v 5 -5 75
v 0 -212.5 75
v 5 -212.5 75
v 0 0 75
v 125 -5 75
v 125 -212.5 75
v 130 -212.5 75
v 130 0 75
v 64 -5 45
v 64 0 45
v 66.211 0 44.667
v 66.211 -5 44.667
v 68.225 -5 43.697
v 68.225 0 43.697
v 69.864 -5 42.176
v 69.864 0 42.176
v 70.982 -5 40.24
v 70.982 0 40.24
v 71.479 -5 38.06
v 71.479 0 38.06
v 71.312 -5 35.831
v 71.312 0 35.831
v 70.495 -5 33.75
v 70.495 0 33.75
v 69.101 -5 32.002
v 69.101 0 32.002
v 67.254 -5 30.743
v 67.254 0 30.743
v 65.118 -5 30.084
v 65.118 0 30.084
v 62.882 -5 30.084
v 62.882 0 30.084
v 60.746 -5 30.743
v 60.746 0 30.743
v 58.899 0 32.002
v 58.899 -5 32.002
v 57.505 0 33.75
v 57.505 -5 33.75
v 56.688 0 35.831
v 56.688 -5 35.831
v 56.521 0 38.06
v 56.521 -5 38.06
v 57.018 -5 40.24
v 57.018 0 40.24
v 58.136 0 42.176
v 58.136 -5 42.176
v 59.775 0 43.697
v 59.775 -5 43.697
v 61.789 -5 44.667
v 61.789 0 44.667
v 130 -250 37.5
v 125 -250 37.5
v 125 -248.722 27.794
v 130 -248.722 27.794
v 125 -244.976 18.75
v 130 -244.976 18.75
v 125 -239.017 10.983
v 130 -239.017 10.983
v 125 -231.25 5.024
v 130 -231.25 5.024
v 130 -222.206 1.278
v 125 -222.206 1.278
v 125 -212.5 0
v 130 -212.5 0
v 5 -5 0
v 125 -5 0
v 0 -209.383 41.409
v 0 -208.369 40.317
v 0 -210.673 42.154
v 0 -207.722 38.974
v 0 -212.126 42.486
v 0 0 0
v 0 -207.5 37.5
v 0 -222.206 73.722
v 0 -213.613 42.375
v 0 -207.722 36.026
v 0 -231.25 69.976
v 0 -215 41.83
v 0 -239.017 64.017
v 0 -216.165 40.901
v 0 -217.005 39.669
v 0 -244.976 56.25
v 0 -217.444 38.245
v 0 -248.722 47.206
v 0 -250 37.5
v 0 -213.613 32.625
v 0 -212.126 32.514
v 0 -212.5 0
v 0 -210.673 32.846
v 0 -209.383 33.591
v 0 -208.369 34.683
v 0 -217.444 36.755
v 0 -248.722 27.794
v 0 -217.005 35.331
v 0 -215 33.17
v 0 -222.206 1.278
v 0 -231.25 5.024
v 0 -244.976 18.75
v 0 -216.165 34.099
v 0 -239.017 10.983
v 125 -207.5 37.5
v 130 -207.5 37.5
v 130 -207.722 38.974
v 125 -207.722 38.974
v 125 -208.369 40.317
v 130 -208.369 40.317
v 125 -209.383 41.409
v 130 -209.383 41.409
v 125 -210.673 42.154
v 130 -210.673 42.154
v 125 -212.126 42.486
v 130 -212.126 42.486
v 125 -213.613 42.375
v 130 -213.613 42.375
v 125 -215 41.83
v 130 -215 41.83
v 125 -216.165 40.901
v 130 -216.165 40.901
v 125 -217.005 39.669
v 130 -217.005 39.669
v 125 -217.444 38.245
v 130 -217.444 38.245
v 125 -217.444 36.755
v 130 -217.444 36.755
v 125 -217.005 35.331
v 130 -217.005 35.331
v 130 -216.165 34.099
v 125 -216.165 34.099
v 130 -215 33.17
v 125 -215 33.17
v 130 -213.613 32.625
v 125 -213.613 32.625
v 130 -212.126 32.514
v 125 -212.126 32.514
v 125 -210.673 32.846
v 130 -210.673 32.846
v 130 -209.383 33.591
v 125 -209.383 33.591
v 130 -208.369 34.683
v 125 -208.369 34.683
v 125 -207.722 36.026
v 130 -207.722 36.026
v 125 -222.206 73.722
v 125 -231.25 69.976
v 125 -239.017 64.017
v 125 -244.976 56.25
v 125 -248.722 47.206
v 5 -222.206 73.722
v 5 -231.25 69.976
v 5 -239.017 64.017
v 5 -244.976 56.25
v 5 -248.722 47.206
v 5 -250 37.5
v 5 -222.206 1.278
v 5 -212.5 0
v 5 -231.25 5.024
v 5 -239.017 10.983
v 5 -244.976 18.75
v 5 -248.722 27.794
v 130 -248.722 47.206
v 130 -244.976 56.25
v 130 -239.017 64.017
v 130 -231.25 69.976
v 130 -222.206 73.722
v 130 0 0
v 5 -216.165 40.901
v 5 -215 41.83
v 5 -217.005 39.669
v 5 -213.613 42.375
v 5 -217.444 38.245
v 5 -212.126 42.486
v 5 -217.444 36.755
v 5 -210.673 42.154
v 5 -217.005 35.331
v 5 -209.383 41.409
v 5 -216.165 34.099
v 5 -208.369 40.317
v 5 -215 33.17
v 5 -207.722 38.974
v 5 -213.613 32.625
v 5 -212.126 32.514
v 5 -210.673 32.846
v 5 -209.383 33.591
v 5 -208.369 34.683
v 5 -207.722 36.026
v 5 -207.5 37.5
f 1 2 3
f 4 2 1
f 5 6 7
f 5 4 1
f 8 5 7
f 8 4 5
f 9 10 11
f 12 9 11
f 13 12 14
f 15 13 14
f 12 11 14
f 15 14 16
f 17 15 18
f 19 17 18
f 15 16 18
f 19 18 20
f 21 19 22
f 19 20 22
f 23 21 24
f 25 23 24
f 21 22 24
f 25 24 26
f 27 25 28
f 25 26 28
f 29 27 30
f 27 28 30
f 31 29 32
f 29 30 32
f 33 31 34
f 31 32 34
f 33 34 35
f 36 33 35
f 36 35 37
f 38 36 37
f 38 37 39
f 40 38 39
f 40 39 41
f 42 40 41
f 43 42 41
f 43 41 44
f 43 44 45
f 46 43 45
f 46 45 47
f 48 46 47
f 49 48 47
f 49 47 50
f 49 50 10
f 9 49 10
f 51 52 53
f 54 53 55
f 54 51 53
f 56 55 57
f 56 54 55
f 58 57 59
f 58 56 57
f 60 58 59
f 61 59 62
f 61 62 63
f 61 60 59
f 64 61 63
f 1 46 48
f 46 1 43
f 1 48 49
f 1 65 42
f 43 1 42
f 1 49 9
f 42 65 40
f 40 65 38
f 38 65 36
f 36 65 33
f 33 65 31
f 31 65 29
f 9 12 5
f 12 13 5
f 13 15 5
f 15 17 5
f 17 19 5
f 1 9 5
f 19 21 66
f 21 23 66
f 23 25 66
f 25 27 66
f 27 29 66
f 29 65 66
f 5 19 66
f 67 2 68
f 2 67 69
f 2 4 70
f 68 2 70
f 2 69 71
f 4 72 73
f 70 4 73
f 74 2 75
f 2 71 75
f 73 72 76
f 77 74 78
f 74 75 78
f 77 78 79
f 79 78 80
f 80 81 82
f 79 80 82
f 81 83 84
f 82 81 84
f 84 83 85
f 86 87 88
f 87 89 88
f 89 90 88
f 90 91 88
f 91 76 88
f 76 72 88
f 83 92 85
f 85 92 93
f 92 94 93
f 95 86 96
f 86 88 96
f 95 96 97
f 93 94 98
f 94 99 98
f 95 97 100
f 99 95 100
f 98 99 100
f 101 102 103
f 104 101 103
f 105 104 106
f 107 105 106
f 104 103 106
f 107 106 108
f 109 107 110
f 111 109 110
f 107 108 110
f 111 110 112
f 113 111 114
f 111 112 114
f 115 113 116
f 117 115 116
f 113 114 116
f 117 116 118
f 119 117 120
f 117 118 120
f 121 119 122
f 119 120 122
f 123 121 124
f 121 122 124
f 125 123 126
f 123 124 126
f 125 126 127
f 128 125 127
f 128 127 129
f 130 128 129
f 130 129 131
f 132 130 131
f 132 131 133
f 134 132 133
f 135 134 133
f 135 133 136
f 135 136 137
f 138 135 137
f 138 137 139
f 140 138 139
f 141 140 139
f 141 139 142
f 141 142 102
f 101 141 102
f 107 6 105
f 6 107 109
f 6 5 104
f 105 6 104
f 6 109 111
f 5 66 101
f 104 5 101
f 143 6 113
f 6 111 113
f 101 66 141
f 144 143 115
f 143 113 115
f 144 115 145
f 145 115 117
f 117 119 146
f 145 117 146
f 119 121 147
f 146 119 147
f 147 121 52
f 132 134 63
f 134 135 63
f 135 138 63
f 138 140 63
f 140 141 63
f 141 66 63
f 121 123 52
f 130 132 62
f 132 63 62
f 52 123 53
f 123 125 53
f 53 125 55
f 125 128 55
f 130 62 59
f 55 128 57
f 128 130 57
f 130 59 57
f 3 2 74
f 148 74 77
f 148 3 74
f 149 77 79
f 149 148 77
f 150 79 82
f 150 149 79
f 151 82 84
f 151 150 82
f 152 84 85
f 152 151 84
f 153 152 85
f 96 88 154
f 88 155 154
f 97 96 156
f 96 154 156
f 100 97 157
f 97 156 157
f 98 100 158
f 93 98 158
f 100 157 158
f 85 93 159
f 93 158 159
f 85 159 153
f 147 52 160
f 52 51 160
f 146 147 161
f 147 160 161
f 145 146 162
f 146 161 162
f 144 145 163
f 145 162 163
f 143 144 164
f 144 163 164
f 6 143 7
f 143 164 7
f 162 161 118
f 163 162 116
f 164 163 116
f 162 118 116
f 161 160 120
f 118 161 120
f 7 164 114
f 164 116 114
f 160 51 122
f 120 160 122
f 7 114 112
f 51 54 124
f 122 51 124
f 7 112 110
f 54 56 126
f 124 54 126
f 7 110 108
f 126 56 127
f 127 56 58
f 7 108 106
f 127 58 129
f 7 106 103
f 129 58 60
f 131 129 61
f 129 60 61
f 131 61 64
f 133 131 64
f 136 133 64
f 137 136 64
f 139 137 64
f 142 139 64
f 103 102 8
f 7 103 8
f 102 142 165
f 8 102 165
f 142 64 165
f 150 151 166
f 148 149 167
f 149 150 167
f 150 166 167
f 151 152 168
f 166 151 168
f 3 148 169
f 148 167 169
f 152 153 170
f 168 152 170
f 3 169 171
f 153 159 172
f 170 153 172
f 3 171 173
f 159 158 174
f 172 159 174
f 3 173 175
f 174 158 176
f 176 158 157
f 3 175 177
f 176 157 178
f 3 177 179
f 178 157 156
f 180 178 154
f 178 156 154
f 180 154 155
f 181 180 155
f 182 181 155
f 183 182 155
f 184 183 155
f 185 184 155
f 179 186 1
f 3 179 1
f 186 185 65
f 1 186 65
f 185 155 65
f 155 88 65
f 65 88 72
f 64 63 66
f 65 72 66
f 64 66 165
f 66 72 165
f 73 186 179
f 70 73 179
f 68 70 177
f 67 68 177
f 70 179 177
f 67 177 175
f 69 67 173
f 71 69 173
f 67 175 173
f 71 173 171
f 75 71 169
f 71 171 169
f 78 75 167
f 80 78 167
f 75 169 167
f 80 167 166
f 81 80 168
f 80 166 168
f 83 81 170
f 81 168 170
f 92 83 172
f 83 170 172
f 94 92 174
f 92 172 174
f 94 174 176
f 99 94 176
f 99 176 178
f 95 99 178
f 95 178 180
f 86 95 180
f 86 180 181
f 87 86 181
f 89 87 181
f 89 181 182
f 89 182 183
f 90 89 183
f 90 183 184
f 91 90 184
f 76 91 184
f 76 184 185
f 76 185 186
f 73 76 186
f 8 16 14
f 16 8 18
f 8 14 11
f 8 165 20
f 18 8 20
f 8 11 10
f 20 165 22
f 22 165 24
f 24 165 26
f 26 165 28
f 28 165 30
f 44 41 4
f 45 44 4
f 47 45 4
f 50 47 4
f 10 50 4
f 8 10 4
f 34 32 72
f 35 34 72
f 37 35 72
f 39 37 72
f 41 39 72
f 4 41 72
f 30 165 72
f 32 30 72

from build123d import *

# Parameters (mm, degrees)
BOSS_EXTRUDE1_DEPTH = 75
SKETCH2_R           = 7.5
CUT_EXTRUDE1_DEPTH  = 8
SKETCH3_R           = 5
CUT_EXTRUDE2_DEPTH  = 134
FILLET1_R           = 37.5


with BuildPart() as part:
    # Sketch1 → Boss-Extrude1 (new body)
    with BuildSketch(Plane.XY):
        Polygon((125, -250), (130, -250), (130, 0), (0, 0), (0, -250), (5, -250), (5, -5), (125, -5), align=None)
    extrude(amount=BOSS_EXTRUDE1_DEPTH)

    # Sketch2 → Cut-Extrude1 (cut)
    with BuildSketch(Plane(origin=(0, 0, 0), x_dir=(1, 0, 0), z_dir=(0, 1, 0))):
        with Locations(Location((64, -37.5, 0), (0, 0, 270))):
            Circle(SKETCH2_R)
    extrude(amount=-CUT_EXTRUDE1_DEPTH, mode=Mode.SUBTRACT)

    # Sketch3 → Cut-Extrude2 (cut)
    with BuildSketch(Plane(origin=(130, 0, 0), x_dir=(0, 0, -1), z_dir=(1, 0, 0))):
        with Locations(Location((-37.5, -212.5, 0), (0, 0, 90))):
            Circle(SKETCH3_R)
    extrude(amount=-CUT_EXTRUDE2_DEPTH, mode=Mode.SUBTRACT)

    # Fillet1
    fillet1_edges = [part.edges().sort_by_distance(p)[0] for p in [
        (127.5, -250, 75),
        (2.5, -250, 75),
        (2.5, -250, 0),
        (127.5, -250, 0),
    ]]
    fillet(fillet1_edges, radius=FILLET1_R - 0.0001)  # a hair under: the kernel refuses the full size


solid = part.part
